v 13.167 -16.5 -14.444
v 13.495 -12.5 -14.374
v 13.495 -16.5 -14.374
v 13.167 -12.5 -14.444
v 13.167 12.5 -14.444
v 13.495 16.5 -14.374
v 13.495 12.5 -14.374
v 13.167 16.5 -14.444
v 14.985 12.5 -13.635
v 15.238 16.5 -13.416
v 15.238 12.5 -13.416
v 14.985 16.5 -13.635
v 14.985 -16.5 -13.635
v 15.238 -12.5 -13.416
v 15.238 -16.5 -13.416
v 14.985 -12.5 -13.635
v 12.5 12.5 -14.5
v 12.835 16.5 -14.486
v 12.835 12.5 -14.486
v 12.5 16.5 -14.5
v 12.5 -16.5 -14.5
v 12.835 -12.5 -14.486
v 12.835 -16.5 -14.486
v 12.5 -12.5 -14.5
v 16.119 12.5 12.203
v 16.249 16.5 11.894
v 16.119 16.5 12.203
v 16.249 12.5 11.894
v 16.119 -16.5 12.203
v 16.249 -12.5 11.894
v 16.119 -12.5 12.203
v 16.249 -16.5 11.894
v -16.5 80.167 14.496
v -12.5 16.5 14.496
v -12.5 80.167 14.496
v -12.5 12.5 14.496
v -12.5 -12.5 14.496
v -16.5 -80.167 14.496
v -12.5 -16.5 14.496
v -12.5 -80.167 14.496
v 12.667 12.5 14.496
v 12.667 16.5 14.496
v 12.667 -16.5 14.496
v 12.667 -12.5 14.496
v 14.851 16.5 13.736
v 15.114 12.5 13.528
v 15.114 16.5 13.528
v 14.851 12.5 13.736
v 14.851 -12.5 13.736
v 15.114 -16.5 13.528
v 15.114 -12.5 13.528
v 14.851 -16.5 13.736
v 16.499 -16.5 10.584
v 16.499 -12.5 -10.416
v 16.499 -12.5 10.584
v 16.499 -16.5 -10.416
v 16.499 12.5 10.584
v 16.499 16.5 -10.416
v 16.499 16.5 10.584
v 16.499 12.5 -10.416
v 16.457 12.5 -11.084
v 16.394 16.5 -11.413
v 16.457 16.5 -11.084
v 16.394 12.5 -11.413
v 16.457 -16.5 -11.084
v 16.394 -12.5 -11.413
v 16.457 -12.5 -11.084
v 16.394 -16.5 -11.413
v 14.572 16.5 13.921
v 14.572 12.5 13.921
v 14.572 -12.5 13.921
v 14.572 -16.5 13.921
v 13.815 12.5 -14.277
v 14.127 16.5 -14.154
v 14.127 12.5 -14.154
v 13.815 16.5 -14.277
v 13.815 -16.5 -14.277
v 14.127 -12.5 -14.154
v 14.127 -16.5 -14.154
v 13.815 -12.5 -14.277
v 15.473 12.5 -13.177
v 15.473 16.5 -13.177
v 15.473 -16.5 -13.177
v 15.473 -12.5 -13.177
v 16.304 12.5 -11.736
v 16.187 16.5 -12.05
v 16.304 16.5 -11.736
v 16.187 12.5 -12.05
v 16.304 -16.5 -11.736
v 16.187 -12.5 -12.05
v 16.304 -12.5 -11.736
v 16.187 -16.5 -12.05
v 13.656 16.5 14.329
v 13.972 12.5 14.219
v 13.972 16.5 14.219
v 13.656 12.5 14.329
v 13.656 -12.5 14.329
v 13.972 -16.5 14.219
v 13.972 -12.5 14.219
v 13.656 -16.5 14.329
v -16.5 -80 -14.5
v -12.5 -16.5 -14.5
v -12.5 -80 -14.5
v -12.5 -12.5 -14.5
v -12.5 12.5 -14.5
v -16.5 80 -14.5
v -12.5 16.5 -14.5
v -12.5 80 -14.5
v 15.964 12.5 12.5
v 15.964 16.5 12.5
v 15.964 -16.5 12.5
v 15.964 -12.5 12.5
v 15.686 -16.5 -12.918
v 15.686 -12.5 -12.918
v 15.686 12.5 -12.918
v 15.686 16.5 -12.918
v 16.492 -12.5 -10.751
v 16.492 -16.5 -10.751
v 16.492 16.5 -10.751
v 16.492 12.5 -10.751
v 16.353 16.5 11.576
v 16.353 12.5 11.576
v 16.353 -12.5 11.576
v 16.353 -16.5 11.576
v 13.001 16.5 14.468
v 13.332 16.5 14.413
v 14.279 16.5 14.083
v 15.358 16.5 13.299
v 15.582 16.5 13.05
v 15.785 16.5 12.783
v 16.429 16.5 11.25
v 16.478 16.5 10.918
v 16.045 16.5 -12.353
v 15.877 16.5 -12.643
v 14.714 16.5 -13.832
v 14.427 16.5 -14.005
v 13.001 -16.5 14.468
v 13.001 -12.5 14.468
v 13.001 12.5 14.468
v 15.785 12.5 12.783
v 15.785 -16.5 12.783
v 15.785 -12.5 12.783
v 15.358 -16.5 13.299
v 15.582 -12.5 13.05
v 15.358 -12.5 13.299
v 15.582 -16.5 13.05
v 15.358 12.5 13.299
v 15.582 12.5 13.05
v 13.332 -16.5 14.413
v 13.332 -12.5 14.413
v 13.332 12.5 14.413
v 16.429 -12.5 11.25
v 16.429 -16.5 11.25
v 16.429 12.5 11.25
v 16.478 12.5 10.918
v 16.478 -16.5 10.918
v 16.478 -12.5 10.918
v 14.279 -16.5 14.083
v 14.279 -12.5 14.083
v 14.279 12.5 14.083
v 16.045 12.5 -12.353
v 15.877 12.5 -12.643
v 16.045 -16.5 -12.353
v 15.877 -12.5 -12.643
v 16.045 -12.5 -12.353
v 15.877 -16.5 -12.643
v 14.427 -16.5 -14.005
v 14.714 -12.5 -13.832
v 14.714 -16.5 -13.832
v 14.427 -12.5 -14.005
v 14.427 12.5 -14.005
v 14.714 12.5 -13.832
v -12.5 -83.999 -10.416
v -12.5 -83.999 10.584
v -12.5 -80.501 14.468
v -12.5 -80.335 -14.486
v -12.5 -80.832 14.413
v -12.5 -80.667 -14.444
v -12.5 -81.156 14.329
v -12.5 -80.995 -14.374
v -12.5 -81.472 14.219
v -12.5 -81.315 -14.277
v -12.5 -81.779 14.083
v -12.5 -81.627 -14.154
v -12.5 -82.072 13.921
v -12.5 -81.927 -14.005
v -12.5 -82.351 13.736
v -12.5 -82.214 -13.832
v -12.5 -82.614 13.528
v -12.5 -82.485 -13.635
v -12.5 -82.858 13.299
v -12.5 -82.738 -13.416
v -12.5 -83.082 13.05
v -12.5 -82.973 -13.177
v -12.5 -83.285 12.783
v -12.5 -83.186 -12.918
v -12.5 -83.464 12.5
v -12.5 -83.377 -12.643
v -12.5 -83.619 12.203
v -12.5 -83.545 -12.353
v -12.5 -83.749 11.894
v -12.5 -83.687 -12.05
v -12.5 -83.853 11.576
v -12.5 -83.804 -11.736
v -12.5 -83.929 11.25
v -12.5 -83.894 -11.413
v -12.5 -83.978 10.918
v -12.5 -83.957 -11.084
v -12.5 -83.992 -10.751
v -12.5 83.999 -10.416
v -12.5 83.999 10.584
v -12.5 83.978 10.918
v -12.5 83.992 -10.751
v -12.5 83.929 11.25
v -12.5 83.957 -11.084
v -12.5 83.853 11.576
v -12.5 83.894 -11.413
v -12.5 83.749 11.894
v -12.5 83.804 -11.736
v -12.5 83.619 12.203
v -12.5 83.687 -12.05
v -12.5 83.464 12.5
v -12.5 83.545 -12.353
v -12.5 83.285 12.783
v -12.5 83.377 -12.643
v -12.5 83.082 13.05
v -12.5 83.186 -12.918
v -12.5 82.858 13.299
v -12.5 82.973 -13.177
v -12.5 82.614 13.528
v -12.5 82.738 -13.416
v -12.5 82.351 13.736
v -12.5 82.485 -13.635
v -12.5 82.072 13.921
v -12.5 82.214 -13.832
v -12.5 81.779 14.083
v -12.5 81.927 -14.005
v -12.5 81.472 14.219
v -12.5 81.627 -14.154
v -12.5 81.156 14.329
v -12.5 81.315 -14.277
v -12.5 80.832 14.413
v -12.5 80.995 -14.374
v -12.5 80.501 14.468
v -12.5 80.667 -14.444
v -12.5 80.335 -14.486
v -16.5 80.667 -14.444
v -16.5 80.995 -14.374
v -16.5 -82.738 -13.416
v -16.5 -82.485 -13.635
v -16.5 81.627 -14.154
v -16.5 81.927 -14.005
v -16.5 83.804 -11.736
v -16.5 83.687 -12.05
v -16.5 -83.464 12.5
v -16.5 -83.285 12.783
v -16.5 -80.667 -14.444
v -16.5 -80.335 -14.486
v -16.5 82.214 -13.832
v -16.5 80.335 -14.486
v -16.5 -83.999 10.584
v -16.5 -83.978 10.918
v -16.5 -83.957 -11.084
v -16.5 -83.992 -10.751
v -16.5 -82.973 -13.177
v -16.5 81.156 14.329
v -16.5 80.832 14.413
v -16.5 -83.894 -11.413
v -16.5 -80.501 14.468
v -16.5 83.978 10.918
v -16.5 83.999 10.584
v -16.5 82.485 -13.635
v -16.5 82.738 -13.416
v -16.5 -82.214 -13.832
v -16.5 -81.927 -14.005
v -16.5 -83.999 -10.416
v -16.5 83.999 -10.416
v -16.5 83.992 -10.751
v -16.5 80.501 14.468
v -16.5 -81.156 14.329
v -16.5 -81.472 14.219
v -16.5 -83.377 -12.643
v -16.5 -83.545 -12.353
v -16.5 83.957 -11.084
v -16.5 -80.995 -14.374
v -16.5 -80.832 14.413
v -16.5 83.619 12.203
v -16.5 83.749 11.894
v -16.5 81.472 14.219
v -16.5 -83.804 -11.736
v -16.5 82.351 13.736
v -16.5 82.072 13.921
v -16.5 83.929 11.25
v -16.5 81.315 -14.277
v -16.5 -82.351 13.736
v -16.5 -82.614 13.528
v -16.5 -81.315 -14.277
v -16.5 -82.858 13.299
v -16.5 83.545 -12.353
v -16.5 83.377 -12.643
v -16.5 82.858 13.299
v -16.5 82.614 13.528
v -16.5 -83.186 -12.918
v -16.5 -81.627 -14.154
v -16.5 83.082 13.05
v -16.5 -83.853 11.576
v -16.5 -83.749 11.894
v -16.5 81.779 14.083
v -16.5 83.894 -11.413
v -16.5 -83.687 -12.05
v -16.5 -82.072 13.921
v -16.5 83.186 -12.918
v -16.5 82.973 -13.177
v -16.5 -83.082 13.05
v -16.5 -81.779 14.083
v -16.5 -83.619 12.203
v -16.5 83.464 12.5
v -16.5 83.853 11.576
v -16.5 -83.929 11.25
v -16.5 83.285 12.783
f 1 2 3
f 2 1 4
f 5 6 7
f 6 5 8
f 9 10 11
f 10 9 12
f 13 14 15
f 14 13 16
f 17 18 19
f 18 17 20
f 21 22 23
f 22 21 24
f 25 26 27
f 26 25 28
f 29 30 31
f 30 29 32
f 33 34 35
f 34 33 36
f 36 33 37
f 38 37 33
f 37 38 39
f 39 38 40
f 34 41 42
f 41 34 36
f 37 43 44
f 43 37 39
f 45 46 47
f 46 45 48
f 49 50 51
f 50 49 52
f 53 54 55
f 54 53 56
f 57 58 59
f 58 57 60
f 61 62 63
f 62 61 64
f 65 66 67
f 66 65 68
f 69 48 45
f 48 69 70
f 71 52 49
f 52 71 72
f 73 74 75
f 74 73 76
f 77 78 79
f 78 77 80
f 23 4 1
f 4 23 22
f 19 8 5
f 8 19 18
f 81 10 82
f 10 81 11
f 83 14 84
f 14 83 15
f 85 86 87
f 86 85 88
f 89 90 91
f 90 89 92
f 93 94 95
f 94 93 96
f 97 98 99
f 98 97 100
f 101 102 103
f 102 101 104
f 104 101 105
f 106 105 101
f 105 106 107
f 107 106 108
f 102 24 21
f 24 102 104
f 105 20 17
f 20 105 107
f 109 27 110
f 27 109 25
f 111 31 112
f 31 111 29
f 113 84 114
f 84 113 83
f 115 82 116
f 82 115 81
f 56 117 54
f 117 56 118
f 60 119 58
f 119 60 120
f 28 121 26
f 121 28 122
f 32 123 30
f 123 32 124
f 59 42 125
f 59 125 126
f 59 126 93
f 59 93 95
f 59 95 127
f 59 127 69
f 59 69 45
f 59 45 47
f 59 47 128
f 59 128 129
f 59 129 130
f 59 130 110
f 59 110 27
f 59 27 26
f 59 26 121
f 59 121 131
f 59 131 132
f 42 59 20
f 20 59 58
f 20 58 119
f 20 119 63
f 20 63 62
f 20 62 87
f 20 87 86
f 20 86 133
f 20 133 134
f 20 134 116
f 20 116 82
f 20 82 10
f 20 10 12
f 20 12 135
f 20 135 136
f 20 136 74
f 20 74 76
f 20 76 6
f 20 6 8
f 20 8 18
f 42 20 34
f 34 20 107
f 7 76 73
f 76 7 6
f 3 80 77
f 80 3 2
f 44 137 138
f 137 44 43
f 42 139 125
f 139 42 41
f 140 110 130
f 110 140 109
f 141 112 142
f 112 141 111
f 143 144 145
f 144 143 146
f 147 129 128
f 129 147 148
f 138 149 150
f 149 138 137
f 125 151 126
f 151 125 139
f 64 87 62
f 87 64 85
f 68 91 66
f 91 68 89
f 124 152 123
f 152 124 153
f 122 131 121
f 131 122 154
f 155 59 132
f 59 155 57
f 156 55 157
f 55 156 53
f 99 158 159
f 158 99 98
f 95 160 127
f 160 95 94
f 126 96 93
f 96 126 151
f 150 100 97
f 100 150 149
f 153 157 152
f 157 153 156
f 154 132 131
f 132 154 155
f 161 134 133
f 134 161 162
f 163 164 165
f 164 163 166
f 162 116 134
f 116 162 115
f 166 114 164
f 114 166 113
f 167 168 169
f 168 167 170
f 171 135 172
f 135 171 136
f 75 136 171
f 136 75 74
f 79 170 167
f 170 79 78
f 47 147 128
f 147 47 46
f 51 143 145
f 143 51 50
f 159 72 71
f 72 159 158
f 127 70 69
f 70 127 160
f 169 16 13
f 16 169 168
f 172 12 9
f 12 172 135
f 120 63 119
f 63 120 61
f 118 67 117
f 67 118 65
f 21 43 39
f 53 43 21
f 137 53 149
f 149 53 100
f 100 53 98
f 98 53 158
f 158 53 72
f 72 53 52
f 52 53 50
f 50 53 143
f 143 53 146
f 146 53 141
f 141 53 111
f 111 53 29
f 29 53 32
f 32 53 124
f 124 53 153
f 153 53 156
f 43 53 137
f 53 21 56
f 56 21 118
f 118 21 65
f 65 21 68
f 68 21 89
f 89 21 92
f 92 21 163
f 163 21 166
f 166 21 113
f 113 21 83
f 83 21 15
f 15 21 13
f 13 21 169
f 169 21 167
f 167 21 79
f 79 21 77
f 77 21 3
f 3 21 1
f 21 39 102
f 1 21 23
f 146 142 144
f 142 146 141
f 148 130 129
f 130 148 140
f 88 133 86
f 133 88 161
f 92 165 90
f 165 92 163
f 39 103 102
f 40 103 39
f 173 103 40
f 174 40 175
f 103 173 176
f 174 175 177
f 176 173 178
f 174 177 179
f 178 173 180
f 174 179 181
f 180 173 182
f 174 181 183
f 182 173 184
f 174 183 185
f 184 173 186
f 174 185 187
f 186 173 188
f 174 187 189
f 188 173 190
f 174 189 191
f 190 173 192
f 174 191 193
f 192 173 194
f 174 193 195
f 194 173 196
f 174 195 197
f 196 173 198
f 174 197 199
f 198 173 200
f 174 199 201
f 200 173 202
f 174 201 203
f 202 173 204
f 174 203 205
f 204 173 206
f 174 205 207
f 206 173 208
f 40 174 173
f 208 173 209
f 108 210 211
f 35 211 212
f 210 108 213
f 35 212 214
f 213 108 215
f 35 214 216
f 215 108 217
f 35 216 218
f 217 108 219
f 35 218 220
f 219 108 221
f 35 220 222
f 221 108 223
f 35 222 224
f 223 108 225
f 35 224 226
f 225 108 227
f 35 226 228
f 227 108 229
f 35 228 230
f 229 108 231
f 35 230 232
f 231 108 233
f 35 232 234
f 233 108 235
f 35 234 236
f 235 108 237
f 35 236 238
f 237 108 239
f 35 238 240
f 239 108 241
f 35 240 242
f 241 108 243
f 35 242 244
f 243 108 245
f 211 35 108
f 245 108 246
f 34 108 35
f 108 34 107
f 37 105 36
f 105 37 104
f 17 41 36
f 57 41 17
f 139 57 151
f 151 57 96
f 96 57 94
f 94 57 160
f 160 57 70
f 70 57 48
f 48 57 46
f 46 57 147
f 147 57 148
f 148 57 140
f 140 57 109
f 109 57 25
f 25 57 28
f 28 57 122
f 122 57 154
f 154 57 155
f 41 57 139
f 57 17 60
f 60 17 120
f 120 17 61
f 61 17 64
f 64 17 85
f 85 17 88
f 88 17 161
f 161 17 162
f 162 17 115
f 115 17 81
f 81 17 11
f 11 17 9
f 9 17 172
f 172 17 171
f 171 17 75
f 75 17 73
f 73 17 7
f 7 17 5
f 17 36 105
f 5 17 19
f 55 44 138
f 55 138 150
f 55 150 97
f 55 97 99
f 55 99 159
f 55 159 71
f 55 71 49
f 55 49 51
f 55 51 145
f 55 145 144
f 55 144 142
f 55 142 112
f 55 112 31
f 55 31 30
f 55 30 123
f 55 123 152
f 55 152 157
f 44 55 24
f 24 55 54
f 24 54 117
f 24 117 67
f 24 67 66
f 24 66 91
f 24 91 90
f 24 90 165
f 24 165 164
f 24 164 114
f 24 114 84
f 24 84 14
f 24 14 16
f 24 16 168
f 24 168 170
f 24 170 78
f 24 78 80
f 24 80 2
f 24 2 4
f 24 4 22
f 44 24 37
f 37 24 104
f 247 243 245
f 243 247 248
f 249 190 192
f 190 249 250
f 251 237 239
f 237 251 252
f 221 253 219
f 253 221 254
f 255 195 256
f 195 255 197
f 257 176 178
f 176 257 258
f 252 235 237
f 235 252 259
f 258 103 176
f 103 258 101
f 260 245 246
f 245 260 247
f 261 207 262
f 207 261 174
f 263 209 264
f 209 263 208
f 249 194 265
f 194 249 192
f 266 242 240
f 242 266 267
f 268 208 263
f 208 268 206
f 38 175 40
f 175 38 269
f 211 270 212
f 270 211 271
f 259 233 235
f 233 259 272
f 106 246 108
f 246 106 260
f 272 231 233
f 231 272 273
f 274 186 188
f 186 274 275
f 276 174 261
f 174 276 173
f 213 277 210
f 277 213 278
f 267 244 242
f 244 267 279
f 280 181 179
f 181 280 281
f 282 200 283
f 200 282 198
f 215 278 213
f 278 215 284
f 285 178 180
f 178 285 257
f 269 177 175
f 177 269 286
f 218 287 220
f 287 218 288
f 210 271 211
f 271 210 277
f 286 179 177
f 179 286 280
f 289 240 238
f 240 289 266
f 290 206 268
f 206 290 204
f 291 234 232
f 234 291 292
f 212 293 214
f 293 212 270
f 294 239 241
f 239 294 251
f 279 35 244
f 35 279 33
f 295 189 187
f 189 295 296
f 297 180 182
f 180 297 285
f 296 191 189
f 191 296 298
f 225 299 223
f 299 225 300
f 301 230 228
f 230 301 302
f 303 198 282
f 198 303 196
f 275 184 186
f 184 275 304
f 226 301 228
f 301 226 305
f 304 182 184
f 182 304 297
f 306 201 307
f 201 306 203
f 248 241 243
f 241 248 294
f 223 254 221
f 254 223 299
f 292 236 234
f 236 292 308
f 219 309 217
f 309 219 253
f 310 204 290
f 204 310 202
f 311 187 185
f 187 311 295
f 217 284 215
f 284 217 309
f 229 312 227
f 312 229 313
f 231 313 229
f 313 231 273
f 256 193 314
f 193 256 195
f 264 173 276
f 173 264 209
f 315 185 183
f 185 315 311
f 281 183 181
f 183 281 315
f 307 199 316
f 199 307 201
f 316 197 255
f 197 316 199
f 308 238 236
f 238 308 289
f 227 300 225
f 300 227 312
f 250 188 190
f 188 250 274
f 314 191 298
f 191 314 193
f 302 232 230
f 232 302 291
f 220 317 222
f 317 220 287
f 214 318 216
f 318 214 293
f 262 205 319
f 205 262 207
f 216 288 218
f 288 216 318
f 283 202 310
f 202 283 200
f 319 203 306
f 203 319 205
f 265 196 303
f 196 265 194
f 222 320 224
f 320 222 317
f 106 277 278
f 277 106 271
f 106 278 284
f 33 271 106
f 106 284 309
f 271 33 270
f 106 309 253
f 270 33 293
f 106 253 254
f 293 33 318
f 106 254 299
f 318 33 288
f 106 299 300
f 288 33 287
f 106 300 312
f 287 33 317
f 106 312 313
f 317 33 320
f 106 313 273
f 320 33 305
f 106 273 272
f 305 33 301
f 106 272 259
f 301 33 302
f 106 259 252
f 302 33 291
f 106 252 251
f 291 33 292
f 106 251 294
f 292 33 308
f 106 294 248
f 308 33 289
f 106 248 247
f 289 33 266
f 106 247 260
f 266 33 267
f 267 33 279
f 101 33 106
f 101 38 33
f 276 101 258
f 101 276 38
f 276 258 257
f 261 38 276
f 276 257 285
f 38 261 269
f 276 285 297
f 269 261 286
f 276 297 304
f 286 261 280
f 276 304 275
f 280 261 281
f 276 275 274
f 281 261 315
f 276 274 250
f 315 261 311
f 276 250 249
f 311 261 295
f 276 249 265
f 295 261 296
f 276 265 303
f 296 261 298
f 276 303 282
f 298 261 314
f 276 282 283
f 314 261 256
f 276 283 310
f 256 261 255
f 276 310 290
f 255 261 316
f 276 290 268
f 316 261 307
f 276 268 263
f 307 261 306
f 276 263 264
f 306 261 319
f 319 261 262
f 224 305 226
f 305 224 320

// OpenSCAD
$fn = 75;

w = 21;
h = 25;
l = 25;

t= 4;
fl = 160; //feet length

infinity = 1000;

rotate([0,90,0])
union(){

difference(){
    rotate([90,0,0])
    linear_extrude(l+2*t, center=true)
    minkowski(){
    square([w,h], center=true);
    circle(t);
    }

    translate([-infinity/2,-l/2,-h/2])
    cube([infinity,l,infinity]);
}

translate([-w/2,-fl/2,-h/2-t])
linear_extrude(t)
minkowski(){
    square([w,fl]);
    circle(t);
}

}
